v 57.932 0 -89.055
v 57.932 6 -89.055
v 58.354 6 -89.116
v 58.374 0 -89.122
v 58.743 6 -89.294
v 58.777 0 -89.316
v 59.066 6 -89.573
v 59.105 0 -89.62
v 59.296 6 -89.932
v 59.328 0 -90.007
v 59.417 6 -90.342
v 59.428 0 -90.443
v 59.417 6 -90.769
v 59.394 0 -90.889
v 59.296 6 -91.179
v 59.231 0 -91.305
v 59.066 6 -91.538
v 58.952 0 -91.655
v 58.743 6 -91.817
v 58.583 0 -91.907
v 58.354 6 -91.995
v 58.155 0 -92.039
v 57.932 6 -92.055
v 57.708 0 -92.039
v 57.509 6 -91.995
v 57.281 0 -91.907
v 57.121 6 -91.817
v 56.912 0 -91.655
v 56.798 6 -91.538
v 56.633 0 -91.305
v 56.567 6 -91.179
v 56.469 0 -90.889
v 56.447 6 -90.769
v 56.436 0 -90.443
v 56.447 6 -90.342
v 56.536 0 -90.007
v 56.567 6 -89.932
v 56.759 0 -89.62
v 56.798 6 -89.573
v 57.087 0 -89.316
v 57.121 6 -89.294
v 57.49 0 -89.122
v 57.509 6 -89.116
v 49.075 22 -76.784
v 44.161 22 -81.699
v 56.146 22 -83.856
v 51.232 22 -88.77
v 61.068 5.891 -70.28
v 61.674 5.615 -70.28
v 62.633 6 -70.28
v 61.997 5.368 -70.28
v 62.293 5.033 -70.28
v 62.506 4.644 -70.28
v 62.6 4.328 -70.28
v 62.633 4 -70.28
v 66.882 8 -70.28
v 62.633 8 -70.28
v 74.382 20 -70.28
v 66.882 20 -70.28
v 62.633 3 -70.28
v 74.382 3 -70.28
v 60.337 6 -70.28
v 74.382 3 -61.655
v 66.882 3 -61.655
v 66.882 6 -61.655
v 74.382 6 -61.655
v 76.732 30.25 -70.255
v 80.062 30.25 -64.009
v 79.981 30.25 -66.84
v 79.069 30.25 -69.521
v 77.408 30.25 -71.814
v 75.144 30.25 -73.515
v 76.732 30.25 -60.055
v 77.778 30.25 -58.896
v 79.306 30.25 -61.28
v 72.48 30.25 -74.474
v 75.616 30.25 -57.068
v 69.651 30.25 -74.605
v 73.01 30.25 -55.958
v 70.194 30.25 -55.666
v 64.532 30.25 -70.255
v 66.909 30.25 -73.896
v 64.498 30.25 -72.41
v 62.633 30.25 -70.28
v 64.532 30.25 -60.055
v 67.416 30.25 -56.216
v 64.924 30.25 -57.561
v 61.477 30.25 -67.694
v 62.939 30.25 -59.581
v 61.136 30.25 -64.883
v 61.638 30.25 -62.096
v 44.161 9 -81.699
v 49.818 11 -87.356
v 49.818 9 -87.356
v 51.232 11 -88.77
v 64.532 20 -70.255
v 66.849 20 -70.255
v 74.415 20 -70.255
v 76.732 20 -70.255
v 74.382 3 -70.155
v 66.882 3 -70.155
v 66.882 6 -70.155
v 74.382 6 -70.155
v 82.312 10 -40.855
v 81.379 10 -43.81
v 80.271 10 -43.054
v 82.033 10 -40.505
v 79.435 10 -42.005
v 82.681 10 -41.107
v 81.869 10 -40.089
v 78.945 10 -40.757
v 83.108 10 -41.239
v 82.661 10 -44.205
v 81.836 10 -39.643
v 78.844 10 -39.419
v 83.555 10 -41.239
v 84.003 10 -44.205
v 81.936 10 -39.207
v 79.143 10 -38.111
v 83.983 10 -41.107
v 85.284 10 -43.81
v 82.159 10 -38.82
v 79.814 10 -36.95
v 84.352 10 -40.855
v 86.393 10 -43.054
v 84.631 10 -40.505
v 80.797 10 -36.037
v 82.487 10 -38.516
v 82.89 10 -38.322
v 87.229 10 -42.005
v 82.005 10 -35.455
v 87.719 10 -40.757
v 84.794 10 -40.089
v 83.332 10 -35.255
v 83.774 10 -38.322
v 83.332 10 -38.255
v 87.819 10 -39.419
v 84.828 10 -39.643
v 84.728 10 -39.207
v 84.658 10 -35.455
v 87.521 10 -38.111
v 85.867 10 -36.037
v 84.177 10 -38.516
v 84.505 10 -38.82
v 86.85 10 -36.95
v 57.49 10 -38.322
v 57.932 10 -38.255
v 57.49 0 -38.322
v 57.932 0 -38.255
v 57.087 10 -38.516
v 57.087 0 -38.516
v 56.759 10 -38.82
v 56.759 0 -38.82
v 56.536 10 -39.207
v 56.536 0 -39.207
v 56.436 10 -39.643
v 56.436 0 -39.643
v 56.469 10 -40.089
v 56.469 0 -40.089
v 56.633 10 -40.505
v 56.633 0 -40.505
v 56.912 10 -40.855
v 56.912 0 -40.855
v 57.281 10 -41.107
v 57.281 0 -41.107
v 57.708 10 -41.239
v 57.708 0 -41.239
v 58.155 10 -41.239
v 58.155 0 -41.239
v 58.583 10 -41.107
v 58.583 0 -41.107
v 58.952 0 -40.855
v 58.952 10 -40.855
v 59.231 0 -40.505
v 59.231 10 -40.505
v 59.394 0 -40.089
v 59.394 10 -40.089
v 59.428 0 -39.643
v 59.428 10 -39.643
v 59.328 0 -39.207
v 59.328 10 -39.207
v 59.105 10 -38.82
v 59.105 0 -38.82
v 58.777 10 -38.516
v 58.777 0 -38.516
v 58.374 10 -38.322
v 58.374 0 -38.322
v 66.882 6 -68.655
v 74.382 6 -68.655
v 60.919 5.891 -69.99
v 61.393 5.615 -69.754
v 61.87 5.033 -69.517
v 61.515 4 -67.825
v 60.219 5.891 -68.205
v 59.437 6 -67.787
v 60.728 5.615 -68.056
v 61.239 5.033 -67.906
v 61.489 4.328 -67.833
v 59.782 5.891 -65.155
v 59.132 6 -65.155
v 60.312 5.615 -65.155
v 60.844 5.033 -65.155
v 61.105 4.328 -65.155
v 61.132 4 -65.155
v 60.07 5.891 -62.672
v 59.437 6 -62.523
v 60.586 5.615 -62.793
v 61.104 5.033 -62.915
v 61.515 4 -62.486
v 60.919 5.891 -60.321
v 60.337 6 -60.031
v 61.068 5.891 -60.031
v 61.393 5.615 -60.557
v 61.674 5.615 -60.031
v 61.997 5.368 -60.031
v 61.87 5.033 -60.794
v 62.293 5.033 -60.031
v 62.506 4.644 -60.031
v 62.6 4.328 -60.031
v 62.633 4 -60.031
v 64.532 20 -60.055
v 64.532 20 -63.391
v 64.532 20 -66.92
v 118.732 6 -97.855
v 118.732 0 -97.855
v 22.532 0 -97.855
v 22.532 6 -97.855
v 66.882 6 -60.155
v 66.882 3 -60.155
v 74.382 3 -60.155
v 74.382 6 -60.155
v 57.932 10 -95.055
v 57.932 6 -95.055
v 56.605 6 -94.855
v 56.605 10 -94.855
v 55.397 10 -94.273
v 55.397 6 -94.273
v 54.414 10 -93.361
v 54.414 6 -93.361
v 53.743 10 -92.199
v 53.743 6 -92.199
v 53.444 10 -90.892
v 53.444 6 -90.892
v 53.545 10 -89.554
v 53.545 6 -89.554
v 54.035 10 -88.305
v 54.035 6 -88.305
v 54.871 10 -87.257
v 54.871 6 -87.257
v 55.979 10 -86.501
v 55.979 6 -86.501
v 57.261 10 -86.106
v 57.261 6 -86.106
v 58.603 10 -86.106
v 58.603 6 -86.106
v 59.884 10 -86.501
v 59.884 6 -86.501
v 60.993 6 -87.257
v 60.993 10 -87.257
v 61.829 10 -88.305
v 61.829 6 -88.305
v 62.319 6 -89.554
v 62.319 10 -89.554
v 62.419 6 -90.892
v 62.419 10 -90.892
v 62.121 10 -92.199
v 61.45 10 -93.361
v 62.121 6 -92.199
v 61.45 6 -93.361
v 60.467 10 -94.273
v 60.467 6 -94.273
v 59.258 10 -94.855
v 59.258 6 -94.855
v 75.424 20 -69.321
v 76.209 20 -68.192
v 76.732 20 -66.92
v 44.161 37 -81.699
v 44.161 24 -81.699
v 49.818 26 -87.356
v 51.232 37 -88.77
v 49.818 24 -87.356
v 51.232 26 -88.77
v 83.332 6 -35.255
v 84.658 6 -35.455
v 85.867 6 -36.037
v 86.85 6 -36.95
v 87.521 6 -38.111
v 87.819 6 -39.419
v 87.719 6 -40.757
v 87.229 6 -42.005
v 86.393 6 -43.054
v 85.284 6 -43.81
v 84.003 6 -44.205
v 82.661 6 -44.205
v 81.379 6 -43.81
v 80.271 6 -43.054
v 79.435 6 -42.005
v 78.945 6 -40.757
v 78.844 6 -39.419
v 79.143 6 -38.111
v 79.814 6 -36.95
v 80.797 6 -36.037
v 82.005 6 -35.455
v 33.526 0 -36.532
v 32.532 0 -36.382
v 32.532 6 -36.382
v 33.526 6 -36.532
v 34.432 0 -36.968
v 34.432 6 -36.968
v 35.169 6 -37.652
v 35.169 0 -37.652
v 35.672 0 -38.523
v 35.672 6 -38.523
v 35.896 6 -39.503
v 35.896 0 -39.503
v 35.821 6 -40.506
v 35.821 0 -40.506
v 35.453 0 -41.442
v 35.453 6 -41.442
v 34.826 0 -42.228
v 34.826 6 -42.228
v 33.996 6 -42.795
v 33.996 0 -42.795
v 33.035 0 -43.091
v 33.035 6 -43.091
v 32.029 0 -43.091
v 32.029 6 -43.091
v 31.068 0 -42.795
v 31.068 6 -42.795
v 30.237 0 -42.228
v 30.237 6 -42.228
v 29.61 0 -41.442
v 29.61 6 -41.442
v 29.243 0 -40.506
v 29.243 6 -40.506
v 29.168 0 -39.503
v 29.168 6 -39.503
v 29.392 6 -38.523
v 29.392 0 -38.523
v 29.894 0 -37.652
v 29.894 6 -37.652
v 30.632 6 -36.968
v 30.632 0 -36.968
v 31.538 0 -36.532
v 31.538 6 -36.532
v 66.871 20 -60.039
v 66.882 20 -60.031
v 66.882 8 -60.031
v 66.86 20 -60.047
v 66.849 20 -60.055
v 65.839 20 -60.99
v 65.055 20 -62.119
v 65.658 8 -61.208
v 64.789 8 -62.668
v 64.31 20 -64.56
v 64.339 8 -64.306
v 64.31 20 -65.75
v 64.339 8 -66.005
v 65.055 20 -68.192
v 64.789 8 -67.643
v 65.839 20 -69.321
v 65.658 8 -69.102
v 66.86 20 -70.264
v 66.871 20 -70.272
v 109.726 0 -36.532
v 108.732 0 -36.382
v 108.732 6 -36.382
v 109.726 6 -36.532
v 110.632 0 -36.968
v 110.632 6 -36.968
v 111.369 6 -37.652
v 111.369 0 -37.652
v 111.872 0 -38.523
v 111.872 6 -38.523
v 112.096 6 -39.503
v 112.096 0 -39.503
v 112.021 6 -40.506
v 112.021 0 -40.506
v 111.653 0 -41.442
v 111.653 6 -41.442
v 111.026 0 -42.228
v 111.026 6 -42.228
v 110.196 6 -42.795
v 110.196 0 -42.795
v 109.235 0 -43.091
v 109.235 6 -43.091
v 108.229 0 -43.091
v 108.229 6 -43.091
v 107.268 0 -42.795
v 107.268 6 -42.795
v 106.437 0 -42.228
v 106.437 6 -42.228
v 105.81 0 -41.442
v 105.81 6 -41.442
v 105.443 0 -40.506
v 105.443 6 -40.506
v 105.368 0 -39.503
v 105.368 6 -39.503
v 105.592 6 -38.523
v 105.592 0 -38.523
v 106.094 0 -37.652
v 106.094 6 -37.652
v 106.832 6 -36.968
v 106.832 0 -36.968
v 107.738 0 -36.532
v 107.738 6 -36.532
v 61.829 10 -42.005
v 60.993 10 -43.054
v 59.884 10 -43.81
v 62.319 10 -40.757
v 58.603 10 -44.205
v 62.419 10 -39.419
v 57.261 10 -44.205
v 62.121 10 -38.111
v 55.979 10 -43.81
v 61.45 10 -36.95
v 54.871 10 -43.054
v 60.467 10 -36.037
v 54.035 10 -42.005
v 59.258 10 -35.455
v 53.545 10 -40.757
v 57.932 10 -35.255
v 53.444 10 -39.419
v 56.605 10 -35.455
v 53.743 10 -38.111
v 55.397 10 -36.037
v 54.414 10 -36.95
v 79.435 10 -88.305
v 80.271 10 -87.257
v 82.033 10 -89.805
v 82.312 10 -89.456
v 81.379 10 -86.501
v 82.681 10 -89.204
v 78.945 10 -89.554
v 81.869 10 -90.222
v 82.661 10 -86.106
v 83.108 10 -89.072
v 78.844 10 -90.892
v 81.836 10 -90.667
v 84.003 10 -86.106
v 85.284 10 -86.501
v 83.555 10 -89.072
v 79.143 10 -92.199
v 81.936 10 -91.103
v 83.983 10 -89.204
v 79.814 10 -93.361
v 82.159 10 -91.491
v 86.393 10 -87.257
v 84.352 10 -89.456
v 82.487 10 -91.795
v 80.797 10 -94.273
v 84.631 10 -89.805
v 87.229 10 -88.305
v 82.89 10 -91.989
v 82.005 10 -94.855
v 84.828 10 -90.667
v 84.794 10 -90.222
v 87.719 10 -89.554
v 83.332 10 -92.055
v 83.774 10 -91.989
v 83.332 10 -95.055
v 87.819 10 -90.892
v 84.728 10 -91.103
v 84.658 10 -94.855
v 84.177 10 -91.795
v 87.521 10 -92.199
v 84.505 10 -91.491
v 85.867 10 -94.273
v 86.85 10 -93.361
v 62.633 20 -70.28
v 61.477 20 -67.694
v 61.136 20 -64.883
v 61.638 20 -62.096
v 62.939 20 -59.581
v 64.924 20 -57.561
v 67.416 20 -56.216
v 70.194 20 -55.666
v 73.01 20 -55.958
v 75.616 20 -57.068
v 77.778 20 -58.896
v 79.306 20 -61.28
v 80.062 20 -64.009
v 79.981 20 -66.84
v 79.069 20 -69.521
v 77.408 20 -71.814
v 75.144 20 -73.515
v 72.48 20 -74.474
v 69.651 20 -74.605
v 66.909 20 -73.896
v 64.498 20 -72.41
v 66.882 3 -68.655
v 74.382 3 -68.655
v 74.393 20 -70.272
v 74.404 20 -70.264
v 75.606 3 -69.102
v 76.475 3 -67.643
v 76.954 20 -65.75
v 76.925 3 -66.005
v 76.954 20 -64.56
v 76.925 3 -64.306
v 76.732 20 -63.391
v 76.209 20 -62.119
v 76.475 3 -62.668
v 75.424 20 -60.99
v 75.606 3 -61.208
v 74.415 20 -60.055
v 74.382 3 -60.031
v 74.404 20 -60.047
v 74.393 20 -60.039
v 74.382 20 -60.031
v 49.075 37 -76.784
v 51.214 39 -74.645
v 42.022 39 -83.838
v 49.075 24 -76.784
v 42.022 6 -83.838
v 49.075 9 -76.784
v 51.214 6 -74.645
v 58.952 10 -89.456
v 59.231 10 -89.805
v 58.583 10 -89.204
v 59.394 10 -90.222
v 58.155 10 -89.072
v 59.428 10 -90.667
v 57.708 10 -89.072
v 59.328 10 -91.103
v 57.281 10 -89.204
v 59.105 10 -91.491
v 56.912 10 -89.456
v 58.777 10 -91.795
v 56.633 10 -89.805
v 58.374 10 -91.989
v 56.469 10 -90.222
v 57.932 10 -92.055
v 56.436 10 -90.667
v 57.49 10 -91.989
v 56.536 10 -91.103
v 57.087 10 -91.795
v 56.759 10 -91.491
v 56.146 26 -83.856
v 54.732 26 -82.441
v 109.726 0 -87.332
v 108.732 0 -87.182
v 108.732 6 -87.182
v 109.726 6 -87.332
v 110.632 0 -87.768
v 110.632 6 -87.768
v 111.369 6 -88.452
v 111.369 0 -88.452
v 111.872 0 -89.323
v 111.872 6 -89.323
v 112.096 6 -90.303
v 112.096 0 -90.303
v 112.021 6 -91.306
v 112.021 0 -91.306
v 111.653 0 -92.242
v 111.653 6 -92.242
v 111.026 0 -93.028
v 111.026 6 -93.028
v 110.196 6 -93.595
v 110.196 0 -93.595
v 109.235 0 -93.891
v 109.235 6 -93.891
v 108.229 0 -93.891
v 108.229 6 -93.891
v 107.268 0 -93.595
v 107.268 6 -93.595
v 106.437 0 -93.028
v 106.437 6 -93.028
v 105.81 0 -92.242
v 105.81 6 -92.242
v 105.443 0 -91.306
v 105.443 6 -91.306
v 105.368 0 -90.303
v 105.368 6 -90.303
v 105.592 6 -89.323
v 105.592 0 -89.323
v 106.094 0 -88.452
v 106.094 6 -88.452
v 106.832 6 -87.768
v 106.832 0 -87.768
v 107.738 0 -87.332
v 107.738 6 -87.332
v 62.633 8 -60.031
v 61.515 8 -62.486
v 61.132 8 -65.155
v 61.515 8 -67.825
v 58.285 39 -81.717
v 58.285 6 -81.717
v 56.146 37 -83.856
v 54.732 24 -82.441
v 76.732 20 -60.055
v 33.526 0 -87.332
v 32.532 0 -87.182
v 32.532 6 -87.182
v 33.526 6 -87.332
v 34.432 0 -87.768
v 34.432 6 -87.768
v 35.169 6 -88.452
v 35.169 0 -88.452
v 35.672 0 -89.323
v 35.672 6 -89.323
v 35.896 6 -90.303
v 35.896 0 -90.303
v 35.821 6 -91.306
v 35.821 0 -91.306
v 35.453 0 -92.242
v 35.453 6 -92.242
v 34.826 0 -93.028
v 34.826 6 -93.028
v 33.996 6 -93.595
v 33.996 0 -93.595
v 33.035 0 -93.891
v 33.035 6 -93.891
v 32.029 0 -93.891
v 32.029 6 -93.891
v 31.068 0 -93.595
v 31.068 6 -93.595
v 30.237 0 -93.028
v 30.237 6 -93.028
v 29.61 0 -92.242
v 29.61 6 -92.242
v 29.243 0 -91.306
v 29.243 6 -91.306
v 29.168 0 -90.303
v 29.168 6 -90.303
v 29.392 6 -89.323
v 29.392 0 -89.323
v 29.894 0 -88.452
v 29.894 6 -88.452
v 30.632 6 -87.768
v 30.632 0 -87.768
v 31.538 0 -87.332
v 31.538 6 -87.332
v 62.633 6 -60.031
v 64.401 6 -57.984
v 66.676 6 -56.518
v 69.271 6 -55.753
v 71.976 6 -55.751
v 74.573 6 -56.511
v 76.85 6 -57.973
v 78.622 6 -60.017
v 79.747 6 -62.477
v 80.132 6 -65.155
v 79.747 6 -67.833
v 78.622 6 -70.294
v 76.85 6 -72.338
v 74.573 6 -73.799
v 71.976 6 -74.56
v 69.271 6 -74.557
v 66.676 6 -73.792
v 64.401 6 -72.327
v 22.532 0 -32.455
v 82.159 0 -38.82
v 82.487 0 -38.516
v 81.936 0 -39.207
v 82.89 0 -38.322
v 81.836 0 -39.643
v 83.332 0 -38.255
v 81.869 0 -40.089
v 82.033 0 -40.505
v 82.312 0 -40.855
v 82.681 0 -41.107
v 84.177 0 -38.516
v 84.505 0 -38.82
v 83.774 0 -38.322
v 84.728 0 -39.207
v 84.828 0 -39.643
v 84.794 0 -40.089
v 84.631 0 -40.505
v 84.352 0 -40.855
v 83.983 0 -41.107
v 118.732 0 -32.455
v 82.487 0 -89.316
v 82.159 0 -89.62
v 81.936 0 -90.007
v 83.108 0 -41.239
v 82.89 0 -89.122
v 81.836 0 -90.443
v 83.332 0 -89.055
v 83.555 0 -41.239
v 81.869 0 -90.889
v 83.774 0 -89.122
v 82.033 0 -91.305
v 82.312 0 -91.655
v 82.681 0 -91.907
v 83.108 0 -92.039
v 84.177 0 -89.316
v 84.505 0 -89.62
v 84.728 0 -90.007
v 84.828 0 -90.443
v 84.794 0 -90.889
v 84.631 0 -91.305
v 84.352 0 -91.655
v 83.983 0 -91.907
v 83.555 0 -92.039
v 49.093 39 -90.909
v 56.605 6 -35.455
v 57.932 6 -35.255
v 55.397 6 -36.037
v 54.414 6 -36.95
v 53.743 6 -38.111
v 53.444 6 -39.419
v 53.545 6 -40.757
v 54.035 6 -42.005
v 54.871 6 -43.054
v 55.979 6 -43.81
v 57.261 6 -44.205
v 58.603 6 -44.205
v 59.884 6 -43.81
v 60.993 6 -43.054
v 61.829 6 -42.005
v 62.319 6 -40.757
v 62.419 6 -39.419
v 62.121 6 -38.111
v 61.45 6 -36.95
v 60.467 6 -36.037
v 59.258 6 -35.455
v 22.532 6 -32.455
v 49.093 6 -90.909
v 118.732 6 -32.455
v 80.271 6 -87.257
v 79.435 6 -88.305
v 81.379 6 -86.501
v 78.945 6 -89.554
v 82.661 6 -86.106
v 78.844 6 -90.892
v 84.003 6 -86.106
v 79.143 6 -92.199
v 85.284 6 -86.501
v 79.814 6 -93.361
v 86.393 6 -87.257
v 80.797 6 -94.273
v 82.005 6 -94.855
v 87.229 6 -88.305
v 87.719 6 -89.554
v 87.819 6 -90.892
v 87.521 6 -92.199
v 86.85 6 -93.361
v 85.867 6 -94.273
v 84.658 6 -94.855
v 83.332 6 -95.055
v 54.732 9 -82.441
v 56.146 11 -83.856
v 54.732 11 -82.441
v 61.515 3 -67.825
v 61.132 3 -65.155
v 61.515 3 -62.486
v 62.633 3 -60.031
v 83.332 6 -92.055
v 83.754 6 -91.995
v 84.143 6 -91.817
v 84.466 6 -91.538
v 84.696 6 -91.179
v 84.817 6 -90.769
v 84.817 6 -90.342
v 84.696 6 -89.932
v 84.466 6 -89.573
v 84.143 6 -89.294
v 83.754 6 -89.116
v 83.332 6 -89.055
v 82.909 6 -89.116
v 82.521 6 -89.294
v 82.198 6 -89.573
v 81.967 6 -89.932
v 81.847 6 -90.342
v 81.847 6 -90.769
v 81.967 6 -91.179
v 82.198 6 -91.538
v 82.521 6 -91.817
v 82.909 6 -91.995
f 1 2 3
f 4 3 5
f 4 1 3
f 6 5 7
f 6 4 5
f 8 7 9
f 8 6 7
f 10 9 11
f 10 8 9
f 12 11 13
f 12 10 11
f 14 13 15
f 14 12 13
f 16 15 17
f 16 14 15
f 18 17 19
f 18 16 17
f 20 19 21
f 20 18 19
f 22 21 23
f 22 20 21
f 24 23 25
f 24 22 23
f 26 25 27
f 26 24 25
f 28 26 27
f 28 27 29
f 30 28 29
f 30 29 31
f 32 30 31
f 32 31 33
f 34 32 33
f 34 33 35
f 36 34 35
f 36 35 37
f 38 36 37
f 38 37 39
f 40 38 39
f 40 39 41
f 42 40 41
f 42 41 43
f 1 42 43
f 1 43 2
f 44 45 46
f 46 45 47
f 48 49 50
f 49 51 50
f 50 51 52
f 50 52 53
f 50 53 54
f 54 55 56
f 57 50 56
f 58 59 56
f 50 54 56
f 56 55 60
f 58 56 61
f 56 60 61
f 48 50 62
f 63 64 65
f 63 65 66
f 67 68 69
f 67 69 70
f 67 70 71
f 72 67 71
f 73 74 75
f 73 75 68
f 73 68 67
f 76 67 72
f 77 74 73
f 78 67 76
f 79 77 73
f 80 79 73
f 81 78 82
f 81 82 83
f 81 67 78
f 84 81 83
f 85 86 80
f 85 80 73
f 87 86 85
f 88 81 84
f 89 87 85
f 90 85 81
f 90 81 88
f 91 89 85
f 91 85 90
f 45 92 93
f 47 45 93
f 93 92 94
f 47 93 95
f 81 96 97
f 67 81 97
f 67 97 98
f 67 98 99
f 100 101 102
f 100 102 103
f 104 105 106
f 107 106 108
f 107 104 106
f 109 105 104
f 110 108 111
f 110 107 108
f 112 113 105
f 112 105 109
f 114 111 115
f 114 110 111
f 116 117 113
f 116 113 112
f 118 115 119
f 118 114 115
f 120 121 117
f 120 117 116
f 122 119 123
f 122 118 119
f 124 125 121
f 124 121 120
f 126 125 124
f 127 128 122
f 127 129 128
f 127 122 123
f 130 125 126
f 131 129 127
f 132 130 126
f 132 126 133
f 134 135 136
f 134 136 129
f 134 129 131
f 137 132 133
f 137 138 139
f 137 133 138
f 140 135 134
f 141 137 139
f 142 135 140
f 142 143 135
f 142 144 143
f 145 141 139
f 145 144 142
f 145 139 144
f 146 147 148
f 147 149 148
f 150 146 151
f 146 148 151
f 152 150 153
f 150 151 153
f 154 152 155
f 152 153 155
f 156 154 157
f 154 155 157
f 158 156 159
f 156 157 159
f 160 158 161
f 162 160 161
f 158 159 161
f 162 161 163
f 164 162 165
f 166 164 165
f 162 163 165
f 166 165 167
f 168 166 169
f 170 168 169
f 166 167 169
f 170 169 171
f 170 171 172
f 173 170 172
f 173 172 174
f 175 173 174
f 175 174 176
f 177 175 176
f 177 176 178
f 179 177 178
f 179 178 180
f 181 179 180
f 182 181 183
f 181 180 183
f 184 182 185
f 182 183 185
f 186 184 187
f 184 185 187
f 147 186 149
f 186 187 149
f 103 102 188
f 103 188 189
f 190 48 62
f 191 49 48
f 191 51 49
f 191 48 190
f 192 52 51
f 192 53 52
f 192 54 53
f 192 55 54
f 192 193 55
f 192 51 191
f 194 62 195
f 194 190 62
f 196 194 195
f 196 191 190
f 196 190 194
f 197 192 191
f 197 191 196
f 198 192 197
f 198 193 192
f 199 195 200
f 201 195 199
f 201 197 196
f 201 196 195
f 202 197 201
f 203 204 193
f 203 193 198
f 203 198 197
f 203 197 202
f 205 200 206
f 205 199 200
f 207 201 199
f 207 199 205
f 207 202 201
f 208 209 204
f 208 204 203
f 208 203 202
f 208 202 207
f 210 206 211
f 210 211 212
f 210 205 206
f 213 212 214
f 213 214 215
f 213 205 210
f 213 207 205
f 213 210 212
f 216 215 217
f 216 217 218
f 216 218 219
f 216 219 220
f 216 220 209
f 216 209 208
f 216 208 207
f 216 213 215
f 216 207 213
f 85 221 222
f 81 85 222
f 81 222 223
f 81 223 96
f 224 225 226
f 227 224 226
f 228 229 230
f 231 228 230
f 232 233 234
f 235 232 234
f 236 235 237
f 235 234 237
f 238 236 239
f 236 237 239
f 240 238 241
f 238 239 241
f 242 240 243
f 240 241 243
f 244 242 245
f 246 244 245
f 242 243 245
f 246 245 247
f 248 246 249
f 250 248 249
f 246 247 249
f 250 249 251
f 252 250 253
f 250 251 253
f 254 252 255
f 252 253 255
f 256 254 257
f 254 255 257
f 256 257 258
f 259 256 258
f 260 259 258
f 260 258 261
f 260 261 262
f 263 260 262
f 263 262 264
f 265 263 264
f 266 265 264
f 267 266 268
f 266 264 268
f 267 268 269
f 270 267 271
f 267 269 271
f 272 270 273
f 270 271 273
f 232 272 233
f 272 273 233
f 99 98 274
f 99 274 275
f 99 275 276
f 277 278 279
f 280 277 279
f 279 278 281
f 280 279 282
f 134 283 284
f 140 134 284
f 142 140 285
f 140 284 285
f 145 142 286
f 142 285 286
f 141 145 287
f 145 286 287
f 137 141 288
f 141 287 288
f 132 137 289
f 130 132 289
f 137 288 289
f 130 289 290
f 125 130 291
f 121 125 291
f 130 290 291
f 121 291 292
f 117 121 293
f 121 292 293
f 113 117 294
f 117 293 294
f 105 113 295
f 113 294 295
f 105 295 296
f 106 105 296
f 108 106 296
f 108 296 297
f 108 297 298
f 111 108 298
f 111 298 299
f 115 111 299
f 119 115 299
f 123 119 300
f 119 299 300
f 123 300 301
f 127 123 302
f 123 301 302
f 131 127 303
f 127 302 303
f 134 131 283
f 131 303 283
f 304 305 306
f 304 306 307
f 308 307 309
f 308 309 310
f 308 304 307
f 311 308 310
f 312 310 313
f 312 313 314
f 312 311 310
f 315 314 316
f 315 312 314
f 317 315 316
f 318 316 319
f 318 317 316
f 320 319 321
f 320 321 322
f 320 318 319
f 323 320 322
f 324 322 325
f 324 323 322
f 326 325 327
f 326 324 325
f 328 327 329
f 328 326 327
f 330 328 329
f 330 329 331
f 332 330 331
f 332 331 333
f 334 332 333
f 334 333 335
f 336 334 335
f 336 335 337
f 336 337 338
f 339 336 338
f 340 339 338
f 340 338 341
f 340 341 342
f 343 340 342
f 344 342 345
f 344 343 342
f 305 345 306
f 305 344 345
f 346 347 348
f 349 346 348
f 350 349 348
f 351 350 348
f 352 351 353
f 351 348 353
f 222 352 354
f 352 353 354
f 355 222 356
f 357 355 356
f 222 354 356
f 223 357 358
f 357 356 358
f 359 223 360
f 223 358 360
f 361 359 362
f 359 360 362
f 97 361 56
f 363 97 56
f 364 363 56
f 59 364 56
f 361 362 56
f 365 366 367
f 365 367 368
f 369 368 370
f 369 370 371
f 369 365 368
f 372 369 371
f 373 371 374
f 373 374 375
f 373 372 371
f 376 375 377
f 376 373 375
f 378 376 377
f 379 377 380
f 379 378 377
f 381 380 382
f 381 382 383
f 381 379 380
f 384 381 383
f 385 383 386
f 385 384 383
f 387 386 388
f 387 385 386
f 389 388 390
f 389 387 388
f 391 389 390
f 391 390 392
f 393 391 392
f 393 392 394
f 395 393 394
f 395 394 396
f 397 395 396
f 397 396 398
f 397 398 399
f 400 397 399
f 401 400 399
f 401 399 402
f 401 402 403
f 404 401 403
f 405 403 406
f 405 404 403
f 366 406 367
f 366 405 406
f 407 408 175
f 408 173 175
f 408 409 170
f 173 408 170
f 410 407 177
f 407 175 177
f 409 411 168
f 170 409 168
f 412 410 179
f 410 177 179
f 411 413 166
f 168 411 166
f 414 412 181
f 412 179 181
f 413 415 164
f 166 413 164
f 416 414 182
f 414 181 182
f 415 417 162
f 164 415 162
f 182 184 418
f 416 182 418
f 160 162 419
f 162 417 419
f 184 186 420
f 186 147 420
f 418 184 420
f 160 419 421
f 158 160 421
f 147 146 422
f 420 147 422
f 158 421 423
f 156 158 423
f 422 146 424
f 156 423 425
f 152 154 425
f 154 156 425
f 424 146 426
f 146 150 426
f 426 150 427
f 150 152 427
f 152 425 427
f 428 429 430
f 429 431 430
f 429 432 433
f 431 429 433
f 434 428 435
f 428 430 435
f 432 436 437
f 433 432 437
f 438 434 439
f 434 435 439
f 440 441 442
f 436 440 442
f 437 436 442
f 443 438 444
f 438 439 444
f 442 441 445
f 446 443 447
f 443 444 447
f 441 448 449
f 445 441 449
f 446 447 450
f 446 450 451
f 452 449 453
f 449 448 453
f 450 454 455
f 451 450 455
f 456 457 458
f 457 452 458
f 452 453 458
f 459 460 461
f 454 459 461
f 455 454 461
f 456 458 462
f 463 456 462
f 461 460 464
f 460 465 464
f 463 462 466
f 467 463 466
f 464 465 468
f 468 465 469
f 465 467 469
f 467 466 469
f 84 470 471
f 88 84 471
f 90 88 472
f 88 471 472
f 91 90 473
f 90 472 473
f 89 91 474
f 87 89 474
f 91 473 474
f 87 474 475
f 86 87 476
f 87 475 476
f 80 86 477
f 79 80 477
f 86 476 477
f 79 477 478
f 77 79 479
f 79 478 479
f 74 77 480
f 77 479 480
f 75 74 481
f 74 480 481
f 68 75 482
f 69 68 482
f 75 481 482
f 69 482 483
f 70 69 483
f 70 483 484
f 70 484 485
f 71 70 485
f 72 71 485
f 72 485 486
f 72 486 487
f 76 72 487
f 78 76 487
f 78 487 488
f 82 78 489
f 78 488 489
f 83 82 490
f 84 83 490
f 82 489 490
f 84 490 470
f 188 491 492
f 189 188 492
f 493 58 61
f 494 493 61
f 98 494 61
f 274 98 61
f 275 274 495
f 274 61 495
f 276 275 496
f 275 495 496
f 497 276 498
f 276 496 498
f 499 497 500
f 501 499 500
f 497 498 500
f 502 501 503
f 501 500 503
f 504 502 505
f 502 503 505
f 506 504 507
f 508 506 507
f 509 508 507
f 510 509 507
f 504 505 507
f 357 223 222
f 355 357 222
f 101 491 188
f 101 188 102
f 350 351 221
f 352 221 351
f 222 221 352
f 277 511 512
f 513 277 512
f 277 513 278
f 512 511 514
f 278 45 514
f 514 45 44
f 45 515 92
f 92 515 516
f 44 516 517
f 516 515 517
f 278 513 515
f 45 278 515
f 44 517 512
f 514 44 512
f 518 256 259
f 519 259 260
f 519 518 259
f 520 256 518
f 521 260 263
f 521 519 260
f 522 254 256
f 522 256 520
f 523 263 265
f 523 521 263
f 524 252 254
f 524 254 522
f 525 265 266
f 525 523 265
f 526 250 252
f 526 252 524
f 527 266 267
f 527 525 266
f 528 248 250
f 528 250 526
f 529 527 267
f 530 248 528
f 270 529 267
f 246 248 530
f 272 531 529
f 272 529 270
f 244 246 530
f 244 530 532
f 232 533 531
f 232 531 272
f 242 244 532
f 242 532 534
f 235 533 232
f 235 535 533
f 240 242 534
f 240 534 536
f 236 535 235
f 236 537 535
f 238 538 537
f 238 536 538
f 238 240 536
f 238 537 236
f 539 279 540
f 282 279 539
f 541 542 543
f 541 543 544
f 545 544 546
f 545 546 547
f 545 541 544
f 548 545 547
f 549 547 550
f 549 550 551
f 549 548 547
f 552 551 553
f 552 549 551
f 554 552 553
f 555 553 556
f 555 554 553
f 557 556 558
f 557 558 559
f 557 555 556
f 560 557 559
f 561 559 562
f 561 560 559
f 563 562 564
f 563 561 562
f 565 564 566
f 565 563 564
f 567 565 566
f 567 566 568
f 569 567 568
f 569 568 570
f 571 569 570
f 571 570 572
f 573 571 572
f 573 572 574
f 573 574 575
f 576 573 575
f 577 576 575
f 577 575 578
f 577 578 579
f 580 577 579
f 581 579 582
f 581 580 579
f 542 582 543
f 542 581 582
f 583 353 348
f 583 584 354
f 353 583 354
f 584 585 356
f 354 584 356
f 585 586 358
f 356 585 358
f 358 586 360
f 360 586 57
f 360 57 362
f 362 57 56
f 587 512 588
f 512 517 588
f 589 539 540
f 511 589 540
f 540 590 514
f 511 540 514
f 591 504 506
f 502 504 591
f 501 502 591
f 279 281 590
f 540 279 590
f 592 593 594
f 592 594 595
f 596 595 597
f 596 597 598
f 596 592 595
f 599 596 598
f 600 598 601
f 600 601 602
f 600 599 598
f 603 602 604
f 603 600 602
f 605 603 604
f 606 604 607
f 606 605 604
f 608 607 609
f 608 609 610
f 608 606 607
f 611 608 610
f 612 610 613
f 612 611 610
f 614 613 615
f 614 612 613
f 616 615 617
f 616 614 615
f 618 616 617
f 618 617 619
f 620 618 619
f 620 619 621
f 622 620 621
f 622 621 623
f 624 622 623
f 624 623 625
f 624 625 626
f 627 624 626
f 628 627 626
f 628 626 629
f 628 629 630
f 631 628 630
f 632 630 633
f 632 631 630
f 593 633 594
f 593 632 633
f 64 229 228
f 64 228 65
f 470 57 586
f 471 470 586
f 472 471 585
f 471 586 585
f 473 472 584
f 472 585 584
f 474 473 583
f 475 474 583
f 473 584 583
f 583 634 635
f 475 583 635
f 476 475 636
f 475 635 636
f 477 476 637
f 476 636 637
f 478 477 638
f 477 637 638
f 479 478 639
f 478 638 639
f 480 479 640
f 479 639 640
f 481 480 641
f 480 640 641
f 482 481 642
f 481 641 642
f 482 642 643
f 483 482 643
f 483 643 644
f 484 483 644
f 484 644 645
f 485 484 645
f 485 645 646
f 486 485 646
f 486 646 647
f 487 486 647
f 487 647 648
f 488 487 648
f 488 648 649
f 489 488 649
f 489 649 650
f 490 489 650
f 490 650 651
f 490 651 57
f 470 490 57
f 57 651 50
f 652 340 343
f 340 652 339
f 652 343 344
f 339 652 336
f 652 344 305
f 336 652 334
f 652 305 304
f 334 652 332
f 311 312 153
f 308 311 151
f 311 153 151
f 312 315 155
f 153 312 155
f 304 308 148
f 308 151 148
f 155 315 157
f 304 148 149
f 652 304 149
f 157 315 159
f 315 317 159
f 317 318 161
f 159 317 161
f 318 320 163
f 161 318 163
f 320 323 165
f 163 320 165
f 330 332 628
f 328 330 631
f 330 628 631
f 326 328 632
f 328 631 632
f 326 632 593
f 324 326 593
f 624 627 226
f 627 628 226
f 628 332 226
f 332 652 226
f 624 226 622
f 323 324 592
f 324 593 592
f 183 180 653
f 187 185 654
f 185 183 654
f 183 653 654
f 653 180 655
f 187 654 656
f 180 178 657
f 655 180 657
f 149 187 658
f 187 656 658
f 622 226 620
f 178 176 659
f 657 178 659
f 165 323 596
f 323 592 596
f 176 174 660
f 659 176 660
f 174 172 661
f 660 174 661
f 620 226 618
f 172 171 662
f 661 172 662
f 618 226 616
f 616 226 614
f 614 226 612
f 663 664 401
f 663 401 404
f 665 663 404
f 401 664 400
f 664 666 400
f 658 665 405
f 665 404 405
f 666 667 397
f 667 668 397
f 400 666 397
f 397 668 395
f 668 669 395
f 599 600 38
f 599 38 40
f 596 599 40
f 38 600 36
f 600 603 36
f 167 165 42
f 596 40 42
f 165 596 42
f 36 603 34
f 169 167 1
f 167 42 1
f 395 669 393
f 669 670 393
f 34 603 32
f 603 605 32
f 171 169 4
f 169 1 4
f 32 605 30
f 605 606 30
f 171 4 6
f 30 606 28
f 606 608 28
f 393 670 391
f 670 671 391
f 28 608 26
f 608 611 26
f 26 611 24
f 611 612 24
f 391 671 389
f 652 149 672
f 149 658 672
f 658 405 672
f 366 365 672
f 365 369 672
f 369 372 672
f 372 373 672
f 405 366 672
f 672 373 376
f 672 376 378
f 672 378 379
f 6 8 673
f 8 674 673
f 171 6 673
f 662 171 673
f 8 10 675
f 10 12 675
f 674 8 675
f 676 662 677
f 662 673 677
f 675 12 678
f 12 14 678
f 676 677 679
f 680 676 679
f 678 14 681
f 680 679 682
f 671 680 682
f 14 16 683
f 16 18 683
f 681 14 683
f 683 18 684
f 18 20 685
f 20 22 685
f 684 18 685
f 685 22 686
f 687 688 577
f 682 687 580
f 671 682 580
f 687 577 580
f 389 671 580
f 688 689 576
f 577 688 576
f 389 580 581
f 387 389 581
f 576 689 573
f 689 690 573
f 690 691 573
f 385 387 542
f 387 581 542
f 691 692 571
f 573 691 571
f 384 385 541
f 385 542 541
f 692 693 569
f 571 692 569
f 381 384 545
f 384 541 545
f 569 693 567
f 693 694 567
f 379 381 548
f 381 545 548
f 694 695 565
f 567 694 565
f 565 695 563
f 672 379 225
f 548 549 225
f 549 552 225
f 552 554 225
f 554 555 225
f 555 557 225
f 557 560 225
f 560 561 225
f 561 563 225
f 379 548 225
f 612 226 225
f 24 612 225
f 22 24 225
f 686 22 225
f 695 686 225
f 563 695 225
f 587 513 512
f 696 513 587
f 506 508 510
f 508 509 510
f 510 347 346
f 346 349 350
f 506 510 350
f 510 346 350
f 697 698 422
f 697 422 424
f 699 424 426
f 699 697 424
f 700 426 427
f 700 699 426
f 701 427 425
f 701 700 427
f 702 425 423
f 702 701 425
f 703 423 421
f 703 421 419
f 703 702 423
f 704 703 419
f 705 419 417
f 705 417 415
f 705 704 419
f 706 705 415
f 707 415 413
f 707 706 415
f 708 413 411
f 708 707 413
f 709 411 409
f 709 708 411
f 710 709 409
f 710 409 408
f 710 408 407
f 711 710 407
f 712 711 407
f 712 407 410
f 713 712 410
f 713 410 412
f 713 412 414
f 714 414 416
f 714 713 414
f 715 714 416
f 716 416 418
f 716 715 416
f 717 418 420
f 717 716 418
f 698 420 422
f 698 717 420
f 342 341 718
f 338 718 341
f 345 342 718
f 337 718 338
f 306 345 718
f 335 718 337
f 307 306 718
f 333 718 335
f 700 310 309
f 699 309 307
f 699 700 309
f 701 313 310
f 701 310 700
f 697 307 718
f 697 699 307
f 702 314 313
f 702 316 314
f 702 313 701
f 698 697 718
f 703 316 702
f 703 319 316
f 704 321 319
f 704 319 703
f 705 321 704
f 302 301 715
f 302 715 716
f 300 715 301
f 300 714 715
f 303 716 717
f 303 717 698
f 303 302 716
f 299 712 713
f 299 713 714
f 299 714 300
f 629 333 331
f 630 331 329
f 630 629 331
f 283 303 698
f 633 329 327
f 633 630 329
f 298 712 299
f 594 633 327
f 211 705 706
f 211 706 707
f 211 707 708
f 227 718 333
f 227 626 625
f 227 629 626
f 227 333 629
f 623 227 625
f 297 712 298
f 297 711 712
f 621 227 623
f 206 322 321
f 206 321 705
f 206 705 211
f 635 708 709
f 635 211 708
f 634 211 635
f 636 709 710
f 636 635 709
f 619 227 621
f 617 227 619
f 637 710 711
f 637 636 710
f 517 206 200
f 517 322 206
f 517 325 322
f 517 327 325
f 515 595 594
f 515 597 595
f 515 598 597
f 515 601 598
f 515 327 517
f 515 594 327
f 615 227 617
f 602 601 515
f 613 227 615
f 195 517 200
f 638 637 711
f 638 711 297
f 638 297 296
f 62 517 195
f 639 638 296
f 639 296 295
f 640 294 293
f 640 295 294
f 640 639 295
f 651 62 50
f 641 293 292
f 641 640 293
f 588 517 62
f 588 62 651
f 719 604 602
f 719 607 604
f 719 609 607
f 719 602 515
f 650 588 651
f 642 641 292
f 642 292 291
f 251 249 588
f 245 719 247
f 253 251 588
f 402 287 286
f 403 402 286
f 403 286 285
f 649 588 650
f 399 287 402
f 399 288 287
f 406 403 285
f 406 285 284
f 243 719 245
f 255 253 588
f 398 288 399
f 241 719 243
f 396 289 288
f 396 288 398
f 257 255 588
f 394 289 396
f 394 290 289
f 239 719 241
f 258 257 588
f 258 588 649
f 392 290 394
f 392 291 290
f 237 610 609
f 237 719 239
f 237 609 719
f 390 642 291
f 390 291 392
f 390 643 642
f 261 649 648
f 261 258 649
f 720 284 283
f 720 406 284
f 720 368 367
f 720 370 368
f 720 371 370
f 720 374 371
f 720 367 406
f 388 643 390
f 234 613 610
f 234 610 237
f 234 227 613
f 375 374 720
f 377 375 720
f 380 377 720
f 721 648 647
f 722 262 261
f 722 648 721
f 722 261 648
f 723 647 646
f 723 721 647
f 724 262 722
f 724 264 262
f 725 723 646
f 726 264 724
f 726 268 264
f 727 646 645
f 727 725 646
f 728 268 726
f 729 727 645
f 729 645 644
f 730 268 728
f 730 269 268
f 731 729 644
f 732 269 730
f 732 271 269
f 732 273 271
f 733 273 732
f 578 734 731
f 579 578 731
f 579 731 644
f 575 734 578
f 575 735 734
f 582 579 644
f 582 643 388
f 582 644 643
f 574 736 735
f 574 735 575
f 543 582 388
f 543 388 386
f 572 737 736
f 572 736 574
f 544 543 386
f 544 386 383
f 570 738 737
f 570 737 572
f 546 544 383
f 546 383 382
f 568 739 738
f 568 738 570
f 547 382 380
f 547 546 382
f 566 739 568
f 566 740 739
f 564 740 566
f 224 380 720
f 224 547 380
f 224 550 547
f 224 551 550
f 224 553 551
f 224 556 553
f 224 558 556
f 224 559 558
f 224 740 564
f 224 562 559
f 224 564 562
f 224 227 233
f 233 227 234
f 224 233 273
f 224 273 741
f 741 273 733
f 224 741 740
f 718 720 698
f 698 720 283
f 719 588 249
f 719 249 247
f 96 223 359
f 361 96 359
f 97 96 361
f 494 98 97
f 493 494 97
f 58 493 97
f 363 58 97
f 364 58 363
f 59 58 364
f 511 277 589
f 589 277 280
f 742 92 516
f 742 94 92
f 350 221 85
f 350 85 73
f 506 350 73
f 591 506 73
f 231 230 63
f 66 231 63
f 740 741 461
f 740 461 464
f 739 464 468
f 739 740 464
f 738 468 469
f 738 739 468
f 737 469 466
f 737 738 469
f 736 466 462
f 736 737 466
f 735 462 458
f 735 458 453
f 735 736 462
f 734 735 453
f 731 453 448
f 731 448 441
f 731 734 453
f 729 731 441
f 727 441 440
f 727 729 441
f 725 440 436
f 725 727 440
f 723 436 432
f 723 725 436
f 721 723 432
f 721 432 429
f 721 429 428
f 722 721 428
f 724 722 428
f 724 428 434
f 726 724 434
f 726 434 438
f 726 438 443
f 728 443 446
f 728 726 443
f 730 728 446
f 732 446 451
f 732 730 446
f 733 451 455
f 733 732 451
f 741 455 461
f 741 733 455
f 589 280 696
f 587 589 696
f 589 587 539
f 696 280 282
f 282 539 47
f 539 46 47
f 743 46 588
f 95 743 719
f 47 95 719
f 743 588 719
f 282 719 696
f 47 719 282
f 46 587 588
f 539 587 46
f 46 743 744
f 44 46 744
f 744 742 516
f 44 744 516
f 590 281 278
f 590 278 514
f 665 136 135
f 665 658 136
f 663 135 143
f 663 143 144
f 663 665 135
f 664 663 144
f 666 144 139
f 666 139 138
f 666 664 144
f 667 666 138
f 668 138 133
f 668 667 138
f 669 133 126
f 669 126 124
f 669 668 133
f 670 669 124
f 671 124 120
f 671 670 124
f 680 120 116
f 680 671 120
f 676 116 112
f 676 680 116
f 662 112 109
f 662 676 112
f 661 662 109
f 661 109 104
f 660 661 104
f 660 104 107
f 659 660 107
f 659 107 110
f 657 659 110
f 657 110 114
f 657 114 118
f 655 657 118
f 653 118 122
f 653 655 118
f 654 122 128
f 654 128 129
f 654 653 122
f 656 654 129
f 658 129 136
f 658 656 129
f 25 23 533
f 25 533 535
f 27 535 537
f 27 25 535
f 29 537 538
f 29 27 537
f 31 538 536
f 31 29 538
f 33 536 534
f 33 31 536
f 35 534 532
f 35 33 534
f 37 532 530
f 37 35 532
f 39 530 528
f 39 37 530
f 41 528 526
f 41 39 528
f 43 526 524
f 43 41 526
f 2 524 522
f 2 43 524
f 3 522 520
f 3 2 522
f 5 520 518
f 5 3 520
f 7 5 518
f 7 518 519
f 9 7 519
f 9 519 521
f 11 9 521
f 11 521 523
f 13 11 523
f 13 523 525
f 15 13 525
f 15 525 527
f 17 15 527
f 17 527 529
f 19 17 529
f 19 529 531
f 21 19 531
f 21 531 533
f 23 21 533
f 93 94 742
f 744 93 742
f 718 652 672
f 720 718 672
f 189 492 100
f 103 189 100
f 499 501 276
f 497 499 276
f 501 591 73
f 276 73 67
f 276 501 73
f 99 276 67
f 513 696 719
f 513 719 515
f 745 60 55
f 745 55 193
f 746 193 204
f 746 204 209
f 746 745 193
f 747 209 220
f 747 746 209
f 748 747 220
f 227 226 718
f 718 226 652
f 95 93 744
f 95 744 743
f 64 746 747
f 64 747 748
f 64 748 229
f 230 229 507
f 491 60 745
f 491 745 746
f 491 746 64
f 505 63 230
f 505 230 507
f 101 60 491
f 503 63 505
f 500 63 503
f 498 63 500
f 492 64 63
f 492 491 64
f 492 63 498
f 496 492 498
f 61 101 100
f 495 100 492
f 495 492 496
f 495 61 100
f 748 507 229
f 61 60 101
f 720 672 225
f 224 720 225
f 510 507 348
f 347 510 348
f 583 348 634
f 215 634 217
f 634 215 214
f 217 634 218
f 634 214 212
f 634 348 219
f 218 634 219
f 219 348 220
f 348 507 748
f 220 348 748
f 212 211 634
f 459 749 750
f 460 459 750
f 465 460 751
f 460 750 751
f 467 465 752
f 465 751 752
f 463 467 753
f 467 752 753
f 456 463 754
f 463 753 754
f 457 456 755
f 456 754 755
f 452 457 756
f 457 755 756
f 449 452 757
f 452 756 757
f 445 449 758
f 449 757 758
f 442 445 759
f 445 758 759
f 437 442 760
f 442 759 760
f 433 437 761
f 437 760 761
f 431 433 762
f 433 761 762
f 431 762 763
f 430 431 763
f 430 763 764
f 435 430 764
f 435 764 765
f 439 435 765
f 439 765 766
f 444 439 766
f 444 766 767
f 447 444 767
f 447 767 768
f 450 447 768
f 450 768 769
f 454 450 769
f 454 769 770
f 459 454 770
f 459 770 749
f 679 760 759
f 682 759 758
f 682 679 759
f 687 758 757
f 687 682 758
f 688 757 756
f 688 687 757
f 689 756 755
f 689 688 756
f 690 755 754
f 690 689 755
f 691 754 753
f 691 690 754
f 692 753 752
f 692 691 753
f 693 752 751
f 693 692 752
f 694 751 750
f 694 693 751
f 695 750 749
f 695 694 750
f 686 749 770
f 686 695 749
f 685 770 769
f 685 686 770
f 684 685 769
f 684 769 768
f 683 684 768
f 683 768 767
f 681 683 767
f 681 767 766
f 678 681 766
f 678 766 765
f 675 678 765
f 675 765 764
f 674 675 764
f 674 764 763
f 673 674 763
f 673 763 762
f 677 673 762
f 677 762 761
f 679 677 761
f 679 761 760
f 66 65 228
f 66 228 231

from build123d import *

# Parameters (mm, degrees)
SKETCH2_R                 = 1.5000000000000042
SKETCH2_R_2               = 1.4999999999999973
SKETCH2_R_3               = 3.37343749999996
BOSS_EXTRUDE1_DEPTH       = 6
SKETCH3_R                 = 4.500000000000005
SKETCH3_R_2               = 1.4999999999999973
BOSS_EXTRUDE2_DEPTH       = 4
MIRROR2_COPY_1_SKETCH_R   = 4.500000000000005
MIRROR2_COPY_1_SKETCH_R_2 = 1.4999999999999973
MIRROR2_COPY_1_DEPTH      = 4
BOSS_EXTRUDE3_DEPTH       = 14
CUT_EXTRUDE2_START        = -3
CUT_EXTRUDE2_DEPTH        = 3
SKETCH8_W                 = 7.5
SKETCH8_H                 = 1.5
BOSS_EXTRUDE4_DEPTH       = 3
BOSS_EXTRUDE5_START       = -12.000000000000004
BOSS_EXTRUDE5_DEPTH       = 12.000000000000004
SKETCH10_R                = 9.499999999999993
SKETCH10_W                = 12.200000000000003
SKETCH10_H                = 10.200000000000003
BOSS_EXTRUDE6_DEPTH       = 10.25
FILLET1_R                 = 2
BOSS_EXTRUDE7_DEPTH       = 3
BOSS_EXTRUDE8_DEPTH       = 2
BOSS_EXTRUDE9_DEPTH       = 11
BOSS_EXTRUDE10_DEPTH      = 2
BOSS_EXTRUDE11_DEPTH      = 2
BOSS_EXTRUDE12_DEPTH      = 11
BOSS_EXTRUDE13_DEPTH      = 2


with BuildPart() as part:
    # Sketch2 → Boss-Extrude1 (new body)
    with BuildSketch(Plane(origin=(0, 0, 0), x_dir=(1, 0, 0), z_dir=(0, 1, 0))):
        Polygon((118.7318886716207, 32.455394598369764), (118.73188867162068, 97.85539459836978), (22.531888671620678, 97.85539459836976), (22.5318886716207, 32.45539459836975), align=None)
        with Locations(Location((57.93188867162069, 39.75539459836976, 0), (0, 0, 270))):
            Circle(SKETCH2_R, mode=Mode.SUBTRACT)
        with Locations(Location((83.3318886716207, 39.75539459836976, 0), (0, 0, 270))):
            Circle(SKETCH2_R_2, mode=Mode.SUBTRACT)
        with Locations(Location((57.931888671620705, 90.55539459836976, 0), (0, 0, 270))):
            Circle(SKETCH2_R_2, mode=Mode.SUBTRACT)
        with Locations(Location((83.3318886716207, 90.55539459836974, 0), (0, 0, 270))):
            Circle(SKETCH2_R_2, mode=Mode.SUBTRACT)
        with Locations(Location((108.7318886716207, 90.55539459836974, 0), (0, 0, 270))):
            Circle(SKETCH2_R_3, mode=Mode.SUBTRACT)
        with Locations(Location((108.73188867162068, 39.755394598369776, 0), (0, 0, 270))):
            Circle(SKETCH2_R_3, mode=Mode.SUBTRACT)
        with Locations(Location((32.53188867162068, 90.55539459836974, 0), (0, 0, 270))):
            Circle(SKETCH2_R_3, mode=Mode.SUBTRACT)
        with Locations(Location((32.53188867162071, 39.755394598369755, 0), (0, 0, 270))):
            Circle(SKETCH2_R_3, mode=Mode.SUBTRACT)
    extrude(amount=BOSS_EXTRUDE1_DEPTH)

    # Sketch3 → Boss-Extrude2 (add)
    with BuildSketch(Plane(origin=(0, 6, 0), x_dir=(1, 0, 0), z_dir=(0, 1, 0))):
        with Locations(Location((83.3318886716207, 39.75539459836976, 0), (0, 0, 270))):
            Circle(SKETCH3_R)
        with Locations(Location((83.3318886716207, 39.75539459836976, 0), (0, 0, 270))):
            Circle(SKETCH3_R_2, mode=Mode.SUBTRACT)
    boss_extrude2 = extrude(amount=BOSS_EXTRUDE2_DEPTH)

    # Mirror1: Boss-Extrude2 across plane
    add(boss_extrude2.mirror(Plane.ZY.offset(-70.6318886716207)))

    # Mirror2: Boss-Extrude2 across plane
    add(boss_extrude2.mirror(Plane(origin=(-1.41e-14, 0, -65.15539459836975), x_dir=(1, 0, -1e-16), z_dir=(-1e-16, 0, -1))))

    # Mirror2 copy 1 sketch → Mirror2 copy 1 (add)
    with BuildSketch(Plane(origin=(141.2637773432414, 6, -130.31078919673953), x_dir=(-1, 0, 2.1e-16), z_dir=(0, 1, 0))):
        with Locations(Location((83.3318886716207, 39.75539459836976, 0), (0, 0, 270))):
            Circle(MIRROR2_COPY_1_SKETCH_R)
        with Locations(Location((83.3318886716207, 39.75539459836976, 0), (0, 0, 270))):
            Circle(MIRROR2_COPY_1_SKETCH_R_2, mode=Mode.SUBTRACT)
    extrude(amount=MIRROR2_COPY_1_DEPTH)

    # Sketch6 → Boss-Extrude3 (add)
    with BuildSketch(Plane(origin=(0, 6, 0), x_dir=(1, 0, 0), z_dir=(0, 1, 0))):
        with BuildLine():
            Line((66.88188867162067, 70.27984578849734), (74.38188867162069, 70.27984578849734))
            ThreePointArc((74.38188867162069, 70.27984578849734), (70.63188867162069, 71.50539459836976), (66.88188867162067, 70.27984578849734))
        make_face()
        with BuildLine():
            ThreePointArc((66.88188867162067, 70.27984578849734), (70.63188867162069, 71.50539459836976), (74.38188867162069, 70.27984578849734))
            ThreePointArc((74.38188867162069, 70.27984578849734), (76.29470599164787, 68.02854617808148), (76.98188867162068, 65.15539459836977))
            ThreePointArc((76.98188867162068, 65.15539459836977), (76.29470599164787, 62.282243018658036), (74.38188867162067, 60.03094340824218))
            ThreePointArc((74.38188867162067, 60.03094340824218), (70.63188867162069, 58.80539459836977), (66.88188867162069, 60.03094340824219))
            Line((66.88188867162069, 60.03094340824217), (62.63251369603666, 60.03094340824217))
            ThreePointArc((62.63251369603667, 60.03094340824218), (73.30171429625909, 56.038266150551124), (80.13188867162069, 65.15539459836977))
            ThreePointArc((80.13188867162069, 65.15539459836977), (73.30171429625909, 74.27252304618841), (62.63251369603665, 70.27984578849734))
            Line((62.632513696036646, 70.27984578849734), (66.88188867162067, 70.27984578849734))
        make_face()
        with BuildLine():
            Line((74.38188867162069, 60.03094340824217), (66.88188867162069, 60.03094340824217))
            ThreePointArc((66.88188867162069, 60.03094340824219), (70.63188867162069, 58.80539459836977), (74.38188867162067, 60.03094340824218))
        make_face()
    extrude(amount=BOSS_EXTRUDE3_DEPTH)

    # Sketch12 → Cut-Extrude2 (cut)
    with BuildSketch(Plane(origin=(0, 6, 0), x_dir=(1, 0, 0), z_dir=(0, 1, 0)).offset(CUT_EXTRUDE2_START)):
        with BuildLine():
            Line((62.63251369603666, 60.03094340824217), (66.88188867162044, 60.03094340824217))
            ThreePointArc((66.88188867162049, 60.03094340824234), (64.28188867162069, 65.15539459836975), (66.88188867162047, 70.27984578849718))
            Line((66.88188867162042, 70.27984578849734), (62.632513696036646, 70.27984578849734))
            ThreePointArc((62.63251369603664, 70.27984578849734), (61.13188867162067, 65.15539459836975), (62.63251369603665, 60.030943408242166))
        make_face()
        with BuildLine():
            Line((66.88188867162044, 60.03094340824217), (74.38188867162069, 60.03094340824218))
            ThreePointArc((74.38188867162069, 60.03094340824219), (76.29470599164789, 62.282243018658036), (76.9818886716207, 65.15539459836977))
            ThreePointArc((76.9818886716207, 65.15539459836977), (76.29470599164789, 68.0285461780815), (74.38188867162069, 70.27984578849734))
            Line((74.38188867162069, 70.27984578849734), (66.88188867162042, 70.27984578849734))
            ThreePointArc((66.88188867162047, 70.27984578849718), (64.28188867162069, 65.15539459836975), (66.88188867162049, 60.03094340824234))
        make_face()
    extrude(amount=CUT_EXTRUDE2_DEPTH, mode=Mode.SUBTRACT)

    # Sketch8 → Boss-Extrude4 (add)
    with BuildSketch(Plane(origin=(0, 3, 0), x_dir=(1, 0, 0), z_dir=(0, 1, 0))):
        with Locations((70.63188867162069, 69.40539459836977)):
            Rectangle(SKETCH8_W, SKETCH8_H)
        with Locations((70.63188867162069, 60.90539459836977)):
            Rectangle(SKETCH8_W, SKETCH8_H)
    extrude(amount=BOSS_EXTRUDE4_DEPTH)

    # Sketch9 → Boss-Extrude5 (add)
    with BuildSketch(Plane(origin=(0, 20, 0), x_dir=(1, 0, 0), z_dir=(0, 1, 0)).offset(BOSS_EXTRUDE5_START)):
        with BuildLine():
            ThreePointArc((80.1318886716207, 65.15539459836977), (73.30171429625909, 74.27252304618843), (62.632513696036646, 70.27984578849735))
            Line((62.632513696036646, 70.27984578849734), (66.88188867162042, 70.27984578849734))
            ThreePointArc((66.88188867162047, 70.27984578849718), (70.63188867162056, 71.50539459836976), (74.38188867162069, 70.27984578849734))
            ThreePointArc((74.38188867162069, 70.27984578849734), (76.29470599164787, 68.02854617808148), (76.98188867162068, 65.15539459836977))
            ThreePointArc((76.98188867162068, 65.15539459836977), (76.29470599164787, 62.282243018658036), (74.38188867162069, 60.03094340824219))
            ThreePointArc((74.38188867162069, 60.03094340824219), (70.63188867162056, 58.80539459836977), (66.88188867162049, 60.03094340824234))
            Line((66.88188867162044, 60.03094340824217), (62.63251369603666, 60.03094340824217))
            ThreePointArc((62.63251369603665, 60.030943408242166), (73.3017142962591, 56.03826615055111), (80.1318886716207, 65.15539459836977))
        make_face()
        with BuildLine():
            Line((66.88188867162042, 70.27984578849734), (62.632513696036646, 70.27984578849734))
            ThreePointArc((62.632513696036646, 70.27984578849735), (61.13188867162067, 65.15539459836975), (62.63251369603665, 60.030943408242166))
            Line((62.63251369603666, 60.03094340824217), (66.88188867162044, 60.03094340824217))
            ThreePointArc((66.88188867162049, 60.03094340824234), (64.28188867162069, 65.15539459836975), (66.88188867162047, 70.27984578849718))
        make_face()
    extrude(amount=BOSS_EXTRUDE5_DEPTH)

    # Sketch10 → Boss-Extrude6 (add)
    with BuildSketch(Plane(origin=(0, 20, 0), x_dir=(1, 0, 0), z_dir=(0, 1, 0))):
        with Locations(Location((70.63188867162069, 65.15539459836977, 0), (0, 0, 147.35611352))):
            Circle(SKETCH10_R)
        with Locations((70.63188867162069, 65.15539459836975)):
            Rectangle(SKETCH10_W, SKETCH10_H, mode=Mode.SUBTRACT)
    extrude(amount=BOSS_EXTRUDE6_DEPTH)

    # Fillet1
    # the kernel refuses this fillet: 2 mm, written as the material it takes off along each edge
    with BuildSketch(Plane(origin=(70.63188867162066, 6, -65.15539459836977), x_dir=(-0.45700581372795496, 0, -0.8894637070835716), z_dir=(0.8894637070835716, 0, -0.45700581372795496))) as fillet1_piece_1_section:
        with BuildLine():
            CenterArc((9.500000000000403 + FILLET1_R, -FILLET1_R), FILLET1_R, 90, 90)
            Line((9.500000000000403, -FILLET1_R), (9.500000000000403, 0))
            Line((9.500000000000403, 0), (9.500000000000403 + FILLET1_R, 0))
        make_face()
    fillet1_piece_1 = revolve(axis=Axis((70.63188867162066, 6, -65.15539459836977), (0, 1, 0)), revolution_arc=125.61186747806521, mode=Mode.PRIVATE)
    fillet1_piece_1 = split(fillet1_piece_1, bisect_by=Plane(origin=(60.560942859837816, 5.429054188217563, -70.27984578849734), z_dir=(0, 0, 1)), keep=Keep.TOP, mode=Mode.PRIVATE)
    fillet1_piece_1 = split(fillet1_piece_1, bisect_by=Plane(origin=(60.560942859837816, 5.429054188217563, -60.03094340824217), z_dir=(0, 0, -1)), keep=Keep.TOP, mode=Mode.PRIVATE)
    add(fillet1_piece_1, mode=Mode.SUBTRACT)

    # Sketch13 → Boss-Extrude7 (add)
    with BuildSketch(Plane(origin=(0, 6, 0), x_dir=(1, 0, 0), z_dir=(0, 1, 0))):
        Polygon((51.21437425034851, 74.64549202167245), (58.285442062214, 81.71655983353793), (49.0930539067889, 90.90894798896305), (42.0219860949234, 83.83788017709759), align=None)
    extrude(amount=BOSS_EXTRUDE7_DEPTH)

    # Sketch14 → Boss-Extrude8 (add)
    with BuildSketch(Plane(origin=(0, 9.000000000000002, 0), x_dir=(1, 0, 0), z_dir=(0, 1, 0))):
        Polygon((42.0219860949234, 83.83788017709759), (44.160984108012705, 81.69888216400828), (49.817838357505074, 87.35573641350065), (54.73223048675158, 82.44134428425414), (49.07537623725921, 76.78449003476177), (51.21437425034851, 74.64549202167245), (58.285442062213995, 81.71655983353793), (49.0930539067889, 90.90894798896305), align=None)
    extrude(amount=BOSS_EXTRUDE8_DEPTH)

    # Sketch15 → Boss-Extrude9 (add)
    with BuildSketch(Plane(origin=(0, 11.000000000000002, 0), x_dir=(1, 0, 0), z_dir=(0, 1, 0))):
        Polygon((44.16098410801271, 81.69888216400828), (49.81783835750507, 87.35573641350065), (51.2320519198782, 88.76994997587377), (49.09305390678893, 90.90894798896306), (42.0219860949234, 83.83788017709759), align=None)
        Polygon((56.14644404912469, 83.85555784662725), (54.732230486751575, 82.44134428425414), (49.0753762372592, 76.78449003476176), (51.21437425034851, 74.64549202167245), (58.285442062213995, 81.71655983353793), align=None)
    extrude(amount=BOSS_EXTRUDE9_DEPTH)

    # Sketch16 → Boss-Extrude10 (add)
    with BuildSketch(Plane(origin=(0, 22, 0), x_dir=(1, 0, 0), z_dir=(0, 1, 0))):
        Polygon((42.0219860949234, 83.83788017709759), (51.21437425034852, 74.64549202167245), (58.285442062213995, 81.71655983353793), (49.093053906788946, 90.90894798896309), align=None)
    extrude(amount=BOSS_EXTRUDE10_DEPTH)

    # Sketch17 → Boss-Extrude11 (add)
    with BuildSketch(Plane(origin=(0, 24, 0), x_dir=(1, 0, 0), z_dir=(0, 1, 0))):
        Polygon((49.81783835750507, 87.35573641350065), (54.732230486751575, 82.44134428425414), (49.0753762372592, 76.78449003476176), (51.21437425034852, 74.64549202167245), (58.285442062213995, 81.71655983353793), (49.093053906788946, 90.90894798896309), (42.0219860949234, 83.83788017709759), (44.160984108012705, 81.69888216400828), align=None)
    extrude(amount=BOSS_EXTRUDE11_DEPTH)

    # Sketch18 → Boss-Extrude12 (add)
    with BuildSketch(Plane(origin=(0, 26.000000000000004, 0), x_dir=(1, 0, 0), z_dir=(0, 1, 0))):
        Polygon((44.16098410801272, 81.69888216400828), (49.81783835750507, 87.35573641350065), (51.23205191987821, 88.76994997587379), (49.093053906788946, 90.90894798896306), (42.0219860949234, 83.83788017709759), align=None)
        Polygon((56.146444049124675, 83.85555784662725), (54.73223048675157, 82.44134428425414), (49.07537623725922, 76.78449003476177), (51.21437425034852, 74.64549202167245), (58.285442062213974, 81.71655983353793), align=None)
    extrude(amount=BOSS_EXTRUDE12_DEPTH)

    # Sketch19 → Boss-Extrude13 (add)
    with BuildSketch(Plane(origin=(0, 37.00000000000001, 0), x_dir=(1, 0, 0), z_dir=(0, 1, 0))):
        Polygon((42.0219860949234, 83.83788017709759), (51.214374250348534, 74.64549202167247), (58.285442062213946, 81.71655983353793), (49.09305390678893, 90.90894798896309), align=None)
    extrude(amount=BOSS_EXTRUDE13_DEPTH)


solid = part.part
